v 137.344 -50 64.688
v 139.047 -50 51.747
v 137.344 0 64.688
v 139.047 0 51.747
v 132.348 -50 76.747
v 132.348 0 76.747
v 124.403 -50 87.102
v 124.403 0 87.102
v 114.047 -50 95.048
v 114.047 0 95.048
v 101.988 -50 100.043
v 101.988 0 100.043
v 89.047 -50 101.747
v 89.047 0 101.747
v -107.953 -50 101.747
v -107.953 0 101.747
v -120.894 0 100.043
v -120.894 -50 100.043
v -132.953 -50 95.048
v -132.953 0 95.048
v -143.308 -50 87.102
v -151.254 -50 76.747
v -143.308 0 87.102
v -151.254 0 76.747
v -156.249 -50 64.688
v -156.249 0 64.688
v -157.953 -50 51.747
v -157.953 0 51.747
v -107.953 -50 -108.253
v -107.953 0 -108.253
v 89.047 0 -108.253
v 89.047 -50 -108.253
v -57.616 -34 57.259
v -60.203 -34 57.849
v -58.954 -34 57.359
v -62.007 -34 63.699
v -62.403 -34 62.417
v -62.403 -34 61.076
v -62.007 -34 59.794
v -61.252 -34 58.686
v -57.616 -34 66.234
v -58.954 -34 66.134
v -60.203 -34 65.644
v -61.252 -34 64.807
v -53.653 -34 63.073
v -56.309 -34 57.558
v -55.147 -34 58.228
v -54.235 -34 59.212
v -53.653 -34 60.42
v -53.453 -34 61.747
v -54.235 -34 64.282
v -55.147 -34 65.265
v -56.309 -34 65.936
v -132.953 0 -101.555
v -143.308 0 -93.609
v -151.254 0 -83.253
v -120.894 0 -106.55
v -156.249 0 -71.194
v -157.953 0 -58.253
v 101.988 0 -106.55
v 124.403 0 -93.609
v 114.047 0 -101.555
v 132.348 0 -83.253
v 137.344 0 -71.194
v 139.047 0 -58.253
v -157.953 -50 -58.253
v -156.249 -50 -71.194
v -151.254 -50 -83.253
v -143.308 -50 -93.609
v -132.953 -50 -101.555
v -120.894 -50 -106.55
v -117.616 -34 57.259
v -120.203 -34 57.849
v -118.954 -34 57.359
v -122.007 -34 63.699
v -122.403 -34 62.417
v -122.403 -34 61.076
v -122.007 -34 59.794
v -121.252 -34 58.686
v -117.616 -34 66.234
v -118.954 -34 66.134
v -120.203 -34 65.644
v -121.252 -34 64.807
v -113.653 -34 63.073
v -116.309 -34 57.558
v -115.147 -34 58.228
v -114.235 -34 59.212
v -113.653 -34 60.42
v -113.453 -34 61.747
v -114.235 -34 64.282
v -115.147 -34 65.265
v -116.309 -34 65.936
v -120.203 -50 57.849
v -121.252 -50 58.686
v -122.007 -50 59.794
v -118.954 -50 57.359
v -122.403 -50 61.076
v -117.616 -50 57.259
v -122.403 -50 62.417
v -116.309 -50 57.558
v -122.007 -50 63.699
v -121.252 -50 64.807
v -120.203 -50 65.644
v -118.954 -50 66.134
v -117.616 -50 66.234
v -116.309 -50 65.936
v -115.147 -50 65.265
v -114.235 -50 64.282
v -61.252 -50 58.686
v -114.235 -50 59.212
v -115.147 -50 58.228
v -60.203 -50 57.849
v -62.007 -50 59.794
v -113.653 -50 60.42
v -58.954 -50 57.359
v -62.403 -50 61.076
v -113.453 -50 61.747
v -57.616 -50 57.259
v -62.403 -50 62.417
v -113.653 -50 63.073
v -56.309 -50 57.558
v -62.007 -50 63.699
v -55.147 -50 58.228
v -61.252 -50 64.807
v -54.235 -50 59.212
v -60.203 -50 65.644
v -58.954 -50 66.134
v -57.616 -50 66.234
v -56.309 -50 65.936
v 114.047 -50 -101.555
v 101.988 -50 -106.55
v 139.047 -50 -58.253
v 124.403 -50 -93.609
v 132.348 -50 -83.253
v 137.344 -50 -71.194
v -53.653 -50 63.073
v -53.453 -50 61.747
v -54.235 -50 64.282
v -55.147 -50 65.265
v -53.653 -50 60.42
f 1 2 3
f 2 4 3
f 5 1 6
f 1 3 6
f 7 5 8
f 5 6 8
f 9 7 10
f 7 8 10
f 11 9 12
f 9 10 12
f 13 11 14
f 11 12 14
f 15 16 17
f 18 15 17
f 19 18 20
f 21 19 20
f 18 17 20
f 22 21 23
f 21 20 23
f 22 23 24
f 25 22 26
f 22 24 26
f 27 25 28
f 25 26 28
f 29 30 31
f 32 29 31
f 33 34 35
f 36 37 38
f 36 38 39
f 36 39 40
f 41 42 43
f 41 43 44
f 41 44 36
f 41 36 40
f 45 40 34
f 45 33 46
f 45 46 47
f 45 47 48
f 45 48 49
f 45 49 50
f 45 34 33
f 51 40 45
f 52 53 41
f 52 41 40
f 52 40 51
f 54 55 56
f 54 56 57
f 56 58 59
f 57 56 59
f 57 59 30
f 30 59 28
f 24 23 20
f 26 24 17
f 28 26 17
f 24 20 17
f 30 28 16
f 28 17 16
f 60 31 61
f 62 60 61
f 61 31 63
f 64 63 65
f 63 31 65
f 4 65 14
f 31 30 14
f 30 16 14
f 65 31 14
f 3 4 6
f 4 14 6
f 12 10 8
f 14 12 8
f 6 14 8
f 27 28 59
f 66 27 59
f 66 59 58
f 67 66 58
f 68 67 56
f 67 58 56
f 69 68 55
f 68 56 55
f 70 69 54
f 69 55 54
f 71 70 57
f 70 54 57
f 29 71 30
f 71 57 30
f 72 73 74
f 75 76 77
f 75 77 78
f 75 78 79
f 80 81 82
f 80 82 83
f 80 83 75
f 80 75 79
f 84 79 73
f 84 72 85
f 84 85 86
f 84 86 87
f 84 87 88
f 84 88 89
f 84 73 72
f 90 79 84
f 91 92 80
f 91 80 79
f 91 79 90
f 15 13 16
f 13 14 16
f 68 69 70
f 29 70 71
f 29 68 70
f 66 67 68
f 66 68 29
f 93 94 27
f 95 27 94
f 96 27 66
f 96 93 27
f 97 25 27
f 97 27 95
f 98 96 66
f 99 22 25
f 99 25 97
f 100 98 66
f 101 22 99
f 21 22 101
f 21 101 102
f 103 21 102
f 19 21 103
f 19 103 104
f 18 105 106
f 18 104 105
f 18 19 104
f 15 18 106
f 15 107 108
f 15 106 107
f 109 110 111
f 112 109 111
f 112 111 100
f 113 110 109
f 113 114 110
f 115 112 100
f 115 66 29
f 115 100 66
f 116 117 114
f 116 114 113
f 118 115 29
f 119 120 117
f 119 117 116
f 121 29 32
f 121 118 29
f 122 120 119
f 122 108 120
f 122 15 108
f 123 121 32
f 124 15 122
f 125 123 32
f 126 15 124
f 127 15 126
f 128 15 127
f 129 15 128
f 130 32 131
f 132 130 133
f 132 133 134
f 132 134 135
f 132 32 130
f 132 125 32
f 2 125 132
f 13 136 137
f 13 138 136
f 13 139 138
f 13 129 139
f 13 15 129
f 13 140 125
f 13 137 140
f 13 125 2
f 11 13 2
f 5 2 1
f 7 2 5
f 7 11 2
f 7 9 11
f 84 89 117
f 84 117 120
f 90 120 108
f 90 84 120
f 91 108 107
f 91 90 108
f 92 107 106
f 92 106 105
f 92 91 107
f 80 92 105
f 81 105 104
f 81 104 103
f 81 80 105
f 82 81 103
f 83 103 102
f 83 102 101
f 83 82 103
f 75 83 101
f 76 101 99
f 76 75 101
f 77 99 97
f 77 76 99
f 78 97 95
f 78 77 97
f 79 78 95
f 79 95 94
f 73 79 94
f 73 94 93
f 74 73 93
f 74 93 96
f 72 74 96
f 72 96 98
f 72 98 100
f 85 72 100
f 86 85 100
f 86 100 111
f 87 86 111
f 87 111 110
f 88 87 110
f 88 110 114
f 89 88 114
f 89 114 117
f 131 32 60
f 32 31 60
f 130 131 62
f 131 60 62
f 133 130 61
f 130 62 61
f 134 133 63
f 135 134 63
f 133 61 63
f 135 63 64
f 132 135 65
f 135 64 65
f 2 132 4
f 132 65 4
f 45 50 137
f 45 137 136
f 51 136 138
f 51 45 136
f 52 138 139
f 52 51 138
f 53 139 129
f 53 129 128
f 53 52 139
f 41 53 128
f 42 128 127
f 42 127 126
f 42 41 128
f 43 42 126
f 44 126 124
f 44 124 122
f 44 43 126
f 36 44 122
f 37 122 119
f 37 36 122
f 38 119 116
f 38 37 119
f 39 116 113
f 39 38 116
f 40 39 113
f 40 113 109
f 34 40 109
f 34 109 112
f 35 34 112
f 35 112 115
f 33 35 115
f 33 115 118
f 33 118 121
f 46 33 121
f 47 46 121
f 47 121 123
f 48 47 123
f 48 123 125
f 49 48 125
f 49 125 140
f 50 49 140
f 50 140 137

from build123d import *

# Parameters (mm, degrees)
F2_DEPTH = 9
F3_R     = 4.5
F4_DEPTH = 25
F6_DEPTH = 25
F7_DEPTH = 25
F8_R     = 4.5
F9_DEPTH = 25


with BuildPart() as f2:
    # F0 (on Front) → F2 (new body)
    with BuildSketch(Plane.XZ):
        with BuildLine():
            Line((89.0472261183, 101.7465810478), (-107.9527738817, 101.7465810478))
            ThreePointArc((-107.9527738817, 101.7465810478), (-143.308112941, 87.1019201071), (-157.9527738817, 51.7465810478))
            Line((-157.9527738817, 51.7465810478), (-157.9527738817, -58.2534189522))
            ThreePointArc((-157.9527738817, -58.2534189522), (-143.308112941, -93.6087580116), (-107.9527738817, -108.2534189522))
            Line((-107.9527738817, -108.2534189522), (89.0472261183, -108.2534189522))
            ThreePointArc((89.0472261183, -108.2534189522), (124.4025651777, -93.6087580116), (139.0472261183, -58.2534189522))
            Line((139.0472261183, -58.2534189522), (139.0472261183, 51.7465810478))
            ThreePointArc((139.0472261183, 51.7465810478), (124.4025651777, 87.1019201071), (89.0472261183, 101.7465810478))
        make_face()
    extrude(amount=F2_DEPTH)

    # F3 (on face) → F4 (join)
    with BuildSketch(Plane.XZ.offset(9)):
        with Locations((-117.9527738817, 61.7465810478)):
            Circle(F3_R)
        with Locations((-57.9527738817, 61.7465810478)):
            Circle(F3_R)
    extrude(amount=F4_DEPTH)

    # F5 (on face) → F6 (cut)
    with BuildSketch(Plane.XZ.offset(9)):
        with BuildLine():
            Line((138.772751035, 56.9784231484), (61.5566782653, 56.9784231484))
            Line((61.5566782653, 56.9784231484), (61.5566782653, 26.1754468083))
            Line((61.5566782653, 26.1754468083), (139.0472261183, 26.1754468083))
            Line((139.0472261183, 26.1754468083), (139.0472261183, 51.7465810478))
            ThreePointArc((139.0472261183, 51.7465810478), (138.9785601974, 54.3660995311), (138.772751035, 56.9784231484))
        make_face()
    extrude(amount=-F6_DEPTH, mode=Mode.SUBTRACT)

    # F1 (on face) → F7 (join)
    with BuildSketch(Plane.XZ):
        with BuildLine():
            ThreePointArc((139.0472261183, 51.7465810478), (124.4025651777, 87.1019201071), (89.0472261183, 101.7465810478))
            Line((89.0472261183, 101.7465810478), (-107.9527738817, 101.7465810478))
            ThreePointArc((-107.9527738817, 101.7465810478), (-143.308112941, 87.1019201071), (-157.9527738817, 51.7465810478))
            Line((-157.9527738817, 51.7465810478), (-157.9527738817, -58.2534189522))
            ThreePointArc((-157.9527738817, -58.2534189522), (-143.308112941, -93.6087580116), (-107.9527738817, -108.2534189522))
            Line((-107.9527738817, -108.2534189522), (89.0472261183, -108.2534189522))
            ThreePointArc((89.0472261183, -108.2534189522), (124.4025651777, -93.6087580116), (139.0472261183, -58.2534189522))
            Line((139.0472261183, -58.2534189522), (139.0472261183, 51.7465810478))
        make_face()
    extrude(amount=F7_DEPTH)

    # F8 (on face) → F9 (join)
    with BuildSketch(Plane.XZ.offset(25)):
        with BuildLine():
            Line((-107.9527738817, -108.2534189522), (89.0472261183, -108.2534189522))
            ThreePointArc((89.0472261183, -108.2534189522), (124.4025651777, -93.6087580116), (139.0472261183, -58.2534189522))
            Line((139.0472261183, -58.2534189522), (139.0472261183, 51.7465810478))
            ThreePointArc((139.0472261183, 51.7465810478), (124.4025651777, 87.1019201071), (89.0472261183, 101.7465810478))
            Line((89.0472261183, 101.7465810478), (-107.9527738817, 101.7465810478))
            ThreePointArc((-107.9527738817, 101.7465810478), (-143.308112941, 87.1019201071), (-157.9527738817, 51.7465810478))
            Line((-157.9527738817, 51.7465810478), (-157.9527738817, -58.2534189522))
            ThreePointArc((-157.9527738817, -58.2534189522), (-143.308112941, -93.6087580116), (-107.9527738817, -108.2534189522))
        make_face()
        with Locations((-117.9527738817, 61.7465810478)):
            Circle(F8_R, mode=Mode.SUBTRACT)
        with Locations((-57.9527738817, 61.7465810478)):
            Circle(F8_R, mode=Mode.SUBTRACT)
    extrude(amount=F9_DEPTH)


solid = f2.part
